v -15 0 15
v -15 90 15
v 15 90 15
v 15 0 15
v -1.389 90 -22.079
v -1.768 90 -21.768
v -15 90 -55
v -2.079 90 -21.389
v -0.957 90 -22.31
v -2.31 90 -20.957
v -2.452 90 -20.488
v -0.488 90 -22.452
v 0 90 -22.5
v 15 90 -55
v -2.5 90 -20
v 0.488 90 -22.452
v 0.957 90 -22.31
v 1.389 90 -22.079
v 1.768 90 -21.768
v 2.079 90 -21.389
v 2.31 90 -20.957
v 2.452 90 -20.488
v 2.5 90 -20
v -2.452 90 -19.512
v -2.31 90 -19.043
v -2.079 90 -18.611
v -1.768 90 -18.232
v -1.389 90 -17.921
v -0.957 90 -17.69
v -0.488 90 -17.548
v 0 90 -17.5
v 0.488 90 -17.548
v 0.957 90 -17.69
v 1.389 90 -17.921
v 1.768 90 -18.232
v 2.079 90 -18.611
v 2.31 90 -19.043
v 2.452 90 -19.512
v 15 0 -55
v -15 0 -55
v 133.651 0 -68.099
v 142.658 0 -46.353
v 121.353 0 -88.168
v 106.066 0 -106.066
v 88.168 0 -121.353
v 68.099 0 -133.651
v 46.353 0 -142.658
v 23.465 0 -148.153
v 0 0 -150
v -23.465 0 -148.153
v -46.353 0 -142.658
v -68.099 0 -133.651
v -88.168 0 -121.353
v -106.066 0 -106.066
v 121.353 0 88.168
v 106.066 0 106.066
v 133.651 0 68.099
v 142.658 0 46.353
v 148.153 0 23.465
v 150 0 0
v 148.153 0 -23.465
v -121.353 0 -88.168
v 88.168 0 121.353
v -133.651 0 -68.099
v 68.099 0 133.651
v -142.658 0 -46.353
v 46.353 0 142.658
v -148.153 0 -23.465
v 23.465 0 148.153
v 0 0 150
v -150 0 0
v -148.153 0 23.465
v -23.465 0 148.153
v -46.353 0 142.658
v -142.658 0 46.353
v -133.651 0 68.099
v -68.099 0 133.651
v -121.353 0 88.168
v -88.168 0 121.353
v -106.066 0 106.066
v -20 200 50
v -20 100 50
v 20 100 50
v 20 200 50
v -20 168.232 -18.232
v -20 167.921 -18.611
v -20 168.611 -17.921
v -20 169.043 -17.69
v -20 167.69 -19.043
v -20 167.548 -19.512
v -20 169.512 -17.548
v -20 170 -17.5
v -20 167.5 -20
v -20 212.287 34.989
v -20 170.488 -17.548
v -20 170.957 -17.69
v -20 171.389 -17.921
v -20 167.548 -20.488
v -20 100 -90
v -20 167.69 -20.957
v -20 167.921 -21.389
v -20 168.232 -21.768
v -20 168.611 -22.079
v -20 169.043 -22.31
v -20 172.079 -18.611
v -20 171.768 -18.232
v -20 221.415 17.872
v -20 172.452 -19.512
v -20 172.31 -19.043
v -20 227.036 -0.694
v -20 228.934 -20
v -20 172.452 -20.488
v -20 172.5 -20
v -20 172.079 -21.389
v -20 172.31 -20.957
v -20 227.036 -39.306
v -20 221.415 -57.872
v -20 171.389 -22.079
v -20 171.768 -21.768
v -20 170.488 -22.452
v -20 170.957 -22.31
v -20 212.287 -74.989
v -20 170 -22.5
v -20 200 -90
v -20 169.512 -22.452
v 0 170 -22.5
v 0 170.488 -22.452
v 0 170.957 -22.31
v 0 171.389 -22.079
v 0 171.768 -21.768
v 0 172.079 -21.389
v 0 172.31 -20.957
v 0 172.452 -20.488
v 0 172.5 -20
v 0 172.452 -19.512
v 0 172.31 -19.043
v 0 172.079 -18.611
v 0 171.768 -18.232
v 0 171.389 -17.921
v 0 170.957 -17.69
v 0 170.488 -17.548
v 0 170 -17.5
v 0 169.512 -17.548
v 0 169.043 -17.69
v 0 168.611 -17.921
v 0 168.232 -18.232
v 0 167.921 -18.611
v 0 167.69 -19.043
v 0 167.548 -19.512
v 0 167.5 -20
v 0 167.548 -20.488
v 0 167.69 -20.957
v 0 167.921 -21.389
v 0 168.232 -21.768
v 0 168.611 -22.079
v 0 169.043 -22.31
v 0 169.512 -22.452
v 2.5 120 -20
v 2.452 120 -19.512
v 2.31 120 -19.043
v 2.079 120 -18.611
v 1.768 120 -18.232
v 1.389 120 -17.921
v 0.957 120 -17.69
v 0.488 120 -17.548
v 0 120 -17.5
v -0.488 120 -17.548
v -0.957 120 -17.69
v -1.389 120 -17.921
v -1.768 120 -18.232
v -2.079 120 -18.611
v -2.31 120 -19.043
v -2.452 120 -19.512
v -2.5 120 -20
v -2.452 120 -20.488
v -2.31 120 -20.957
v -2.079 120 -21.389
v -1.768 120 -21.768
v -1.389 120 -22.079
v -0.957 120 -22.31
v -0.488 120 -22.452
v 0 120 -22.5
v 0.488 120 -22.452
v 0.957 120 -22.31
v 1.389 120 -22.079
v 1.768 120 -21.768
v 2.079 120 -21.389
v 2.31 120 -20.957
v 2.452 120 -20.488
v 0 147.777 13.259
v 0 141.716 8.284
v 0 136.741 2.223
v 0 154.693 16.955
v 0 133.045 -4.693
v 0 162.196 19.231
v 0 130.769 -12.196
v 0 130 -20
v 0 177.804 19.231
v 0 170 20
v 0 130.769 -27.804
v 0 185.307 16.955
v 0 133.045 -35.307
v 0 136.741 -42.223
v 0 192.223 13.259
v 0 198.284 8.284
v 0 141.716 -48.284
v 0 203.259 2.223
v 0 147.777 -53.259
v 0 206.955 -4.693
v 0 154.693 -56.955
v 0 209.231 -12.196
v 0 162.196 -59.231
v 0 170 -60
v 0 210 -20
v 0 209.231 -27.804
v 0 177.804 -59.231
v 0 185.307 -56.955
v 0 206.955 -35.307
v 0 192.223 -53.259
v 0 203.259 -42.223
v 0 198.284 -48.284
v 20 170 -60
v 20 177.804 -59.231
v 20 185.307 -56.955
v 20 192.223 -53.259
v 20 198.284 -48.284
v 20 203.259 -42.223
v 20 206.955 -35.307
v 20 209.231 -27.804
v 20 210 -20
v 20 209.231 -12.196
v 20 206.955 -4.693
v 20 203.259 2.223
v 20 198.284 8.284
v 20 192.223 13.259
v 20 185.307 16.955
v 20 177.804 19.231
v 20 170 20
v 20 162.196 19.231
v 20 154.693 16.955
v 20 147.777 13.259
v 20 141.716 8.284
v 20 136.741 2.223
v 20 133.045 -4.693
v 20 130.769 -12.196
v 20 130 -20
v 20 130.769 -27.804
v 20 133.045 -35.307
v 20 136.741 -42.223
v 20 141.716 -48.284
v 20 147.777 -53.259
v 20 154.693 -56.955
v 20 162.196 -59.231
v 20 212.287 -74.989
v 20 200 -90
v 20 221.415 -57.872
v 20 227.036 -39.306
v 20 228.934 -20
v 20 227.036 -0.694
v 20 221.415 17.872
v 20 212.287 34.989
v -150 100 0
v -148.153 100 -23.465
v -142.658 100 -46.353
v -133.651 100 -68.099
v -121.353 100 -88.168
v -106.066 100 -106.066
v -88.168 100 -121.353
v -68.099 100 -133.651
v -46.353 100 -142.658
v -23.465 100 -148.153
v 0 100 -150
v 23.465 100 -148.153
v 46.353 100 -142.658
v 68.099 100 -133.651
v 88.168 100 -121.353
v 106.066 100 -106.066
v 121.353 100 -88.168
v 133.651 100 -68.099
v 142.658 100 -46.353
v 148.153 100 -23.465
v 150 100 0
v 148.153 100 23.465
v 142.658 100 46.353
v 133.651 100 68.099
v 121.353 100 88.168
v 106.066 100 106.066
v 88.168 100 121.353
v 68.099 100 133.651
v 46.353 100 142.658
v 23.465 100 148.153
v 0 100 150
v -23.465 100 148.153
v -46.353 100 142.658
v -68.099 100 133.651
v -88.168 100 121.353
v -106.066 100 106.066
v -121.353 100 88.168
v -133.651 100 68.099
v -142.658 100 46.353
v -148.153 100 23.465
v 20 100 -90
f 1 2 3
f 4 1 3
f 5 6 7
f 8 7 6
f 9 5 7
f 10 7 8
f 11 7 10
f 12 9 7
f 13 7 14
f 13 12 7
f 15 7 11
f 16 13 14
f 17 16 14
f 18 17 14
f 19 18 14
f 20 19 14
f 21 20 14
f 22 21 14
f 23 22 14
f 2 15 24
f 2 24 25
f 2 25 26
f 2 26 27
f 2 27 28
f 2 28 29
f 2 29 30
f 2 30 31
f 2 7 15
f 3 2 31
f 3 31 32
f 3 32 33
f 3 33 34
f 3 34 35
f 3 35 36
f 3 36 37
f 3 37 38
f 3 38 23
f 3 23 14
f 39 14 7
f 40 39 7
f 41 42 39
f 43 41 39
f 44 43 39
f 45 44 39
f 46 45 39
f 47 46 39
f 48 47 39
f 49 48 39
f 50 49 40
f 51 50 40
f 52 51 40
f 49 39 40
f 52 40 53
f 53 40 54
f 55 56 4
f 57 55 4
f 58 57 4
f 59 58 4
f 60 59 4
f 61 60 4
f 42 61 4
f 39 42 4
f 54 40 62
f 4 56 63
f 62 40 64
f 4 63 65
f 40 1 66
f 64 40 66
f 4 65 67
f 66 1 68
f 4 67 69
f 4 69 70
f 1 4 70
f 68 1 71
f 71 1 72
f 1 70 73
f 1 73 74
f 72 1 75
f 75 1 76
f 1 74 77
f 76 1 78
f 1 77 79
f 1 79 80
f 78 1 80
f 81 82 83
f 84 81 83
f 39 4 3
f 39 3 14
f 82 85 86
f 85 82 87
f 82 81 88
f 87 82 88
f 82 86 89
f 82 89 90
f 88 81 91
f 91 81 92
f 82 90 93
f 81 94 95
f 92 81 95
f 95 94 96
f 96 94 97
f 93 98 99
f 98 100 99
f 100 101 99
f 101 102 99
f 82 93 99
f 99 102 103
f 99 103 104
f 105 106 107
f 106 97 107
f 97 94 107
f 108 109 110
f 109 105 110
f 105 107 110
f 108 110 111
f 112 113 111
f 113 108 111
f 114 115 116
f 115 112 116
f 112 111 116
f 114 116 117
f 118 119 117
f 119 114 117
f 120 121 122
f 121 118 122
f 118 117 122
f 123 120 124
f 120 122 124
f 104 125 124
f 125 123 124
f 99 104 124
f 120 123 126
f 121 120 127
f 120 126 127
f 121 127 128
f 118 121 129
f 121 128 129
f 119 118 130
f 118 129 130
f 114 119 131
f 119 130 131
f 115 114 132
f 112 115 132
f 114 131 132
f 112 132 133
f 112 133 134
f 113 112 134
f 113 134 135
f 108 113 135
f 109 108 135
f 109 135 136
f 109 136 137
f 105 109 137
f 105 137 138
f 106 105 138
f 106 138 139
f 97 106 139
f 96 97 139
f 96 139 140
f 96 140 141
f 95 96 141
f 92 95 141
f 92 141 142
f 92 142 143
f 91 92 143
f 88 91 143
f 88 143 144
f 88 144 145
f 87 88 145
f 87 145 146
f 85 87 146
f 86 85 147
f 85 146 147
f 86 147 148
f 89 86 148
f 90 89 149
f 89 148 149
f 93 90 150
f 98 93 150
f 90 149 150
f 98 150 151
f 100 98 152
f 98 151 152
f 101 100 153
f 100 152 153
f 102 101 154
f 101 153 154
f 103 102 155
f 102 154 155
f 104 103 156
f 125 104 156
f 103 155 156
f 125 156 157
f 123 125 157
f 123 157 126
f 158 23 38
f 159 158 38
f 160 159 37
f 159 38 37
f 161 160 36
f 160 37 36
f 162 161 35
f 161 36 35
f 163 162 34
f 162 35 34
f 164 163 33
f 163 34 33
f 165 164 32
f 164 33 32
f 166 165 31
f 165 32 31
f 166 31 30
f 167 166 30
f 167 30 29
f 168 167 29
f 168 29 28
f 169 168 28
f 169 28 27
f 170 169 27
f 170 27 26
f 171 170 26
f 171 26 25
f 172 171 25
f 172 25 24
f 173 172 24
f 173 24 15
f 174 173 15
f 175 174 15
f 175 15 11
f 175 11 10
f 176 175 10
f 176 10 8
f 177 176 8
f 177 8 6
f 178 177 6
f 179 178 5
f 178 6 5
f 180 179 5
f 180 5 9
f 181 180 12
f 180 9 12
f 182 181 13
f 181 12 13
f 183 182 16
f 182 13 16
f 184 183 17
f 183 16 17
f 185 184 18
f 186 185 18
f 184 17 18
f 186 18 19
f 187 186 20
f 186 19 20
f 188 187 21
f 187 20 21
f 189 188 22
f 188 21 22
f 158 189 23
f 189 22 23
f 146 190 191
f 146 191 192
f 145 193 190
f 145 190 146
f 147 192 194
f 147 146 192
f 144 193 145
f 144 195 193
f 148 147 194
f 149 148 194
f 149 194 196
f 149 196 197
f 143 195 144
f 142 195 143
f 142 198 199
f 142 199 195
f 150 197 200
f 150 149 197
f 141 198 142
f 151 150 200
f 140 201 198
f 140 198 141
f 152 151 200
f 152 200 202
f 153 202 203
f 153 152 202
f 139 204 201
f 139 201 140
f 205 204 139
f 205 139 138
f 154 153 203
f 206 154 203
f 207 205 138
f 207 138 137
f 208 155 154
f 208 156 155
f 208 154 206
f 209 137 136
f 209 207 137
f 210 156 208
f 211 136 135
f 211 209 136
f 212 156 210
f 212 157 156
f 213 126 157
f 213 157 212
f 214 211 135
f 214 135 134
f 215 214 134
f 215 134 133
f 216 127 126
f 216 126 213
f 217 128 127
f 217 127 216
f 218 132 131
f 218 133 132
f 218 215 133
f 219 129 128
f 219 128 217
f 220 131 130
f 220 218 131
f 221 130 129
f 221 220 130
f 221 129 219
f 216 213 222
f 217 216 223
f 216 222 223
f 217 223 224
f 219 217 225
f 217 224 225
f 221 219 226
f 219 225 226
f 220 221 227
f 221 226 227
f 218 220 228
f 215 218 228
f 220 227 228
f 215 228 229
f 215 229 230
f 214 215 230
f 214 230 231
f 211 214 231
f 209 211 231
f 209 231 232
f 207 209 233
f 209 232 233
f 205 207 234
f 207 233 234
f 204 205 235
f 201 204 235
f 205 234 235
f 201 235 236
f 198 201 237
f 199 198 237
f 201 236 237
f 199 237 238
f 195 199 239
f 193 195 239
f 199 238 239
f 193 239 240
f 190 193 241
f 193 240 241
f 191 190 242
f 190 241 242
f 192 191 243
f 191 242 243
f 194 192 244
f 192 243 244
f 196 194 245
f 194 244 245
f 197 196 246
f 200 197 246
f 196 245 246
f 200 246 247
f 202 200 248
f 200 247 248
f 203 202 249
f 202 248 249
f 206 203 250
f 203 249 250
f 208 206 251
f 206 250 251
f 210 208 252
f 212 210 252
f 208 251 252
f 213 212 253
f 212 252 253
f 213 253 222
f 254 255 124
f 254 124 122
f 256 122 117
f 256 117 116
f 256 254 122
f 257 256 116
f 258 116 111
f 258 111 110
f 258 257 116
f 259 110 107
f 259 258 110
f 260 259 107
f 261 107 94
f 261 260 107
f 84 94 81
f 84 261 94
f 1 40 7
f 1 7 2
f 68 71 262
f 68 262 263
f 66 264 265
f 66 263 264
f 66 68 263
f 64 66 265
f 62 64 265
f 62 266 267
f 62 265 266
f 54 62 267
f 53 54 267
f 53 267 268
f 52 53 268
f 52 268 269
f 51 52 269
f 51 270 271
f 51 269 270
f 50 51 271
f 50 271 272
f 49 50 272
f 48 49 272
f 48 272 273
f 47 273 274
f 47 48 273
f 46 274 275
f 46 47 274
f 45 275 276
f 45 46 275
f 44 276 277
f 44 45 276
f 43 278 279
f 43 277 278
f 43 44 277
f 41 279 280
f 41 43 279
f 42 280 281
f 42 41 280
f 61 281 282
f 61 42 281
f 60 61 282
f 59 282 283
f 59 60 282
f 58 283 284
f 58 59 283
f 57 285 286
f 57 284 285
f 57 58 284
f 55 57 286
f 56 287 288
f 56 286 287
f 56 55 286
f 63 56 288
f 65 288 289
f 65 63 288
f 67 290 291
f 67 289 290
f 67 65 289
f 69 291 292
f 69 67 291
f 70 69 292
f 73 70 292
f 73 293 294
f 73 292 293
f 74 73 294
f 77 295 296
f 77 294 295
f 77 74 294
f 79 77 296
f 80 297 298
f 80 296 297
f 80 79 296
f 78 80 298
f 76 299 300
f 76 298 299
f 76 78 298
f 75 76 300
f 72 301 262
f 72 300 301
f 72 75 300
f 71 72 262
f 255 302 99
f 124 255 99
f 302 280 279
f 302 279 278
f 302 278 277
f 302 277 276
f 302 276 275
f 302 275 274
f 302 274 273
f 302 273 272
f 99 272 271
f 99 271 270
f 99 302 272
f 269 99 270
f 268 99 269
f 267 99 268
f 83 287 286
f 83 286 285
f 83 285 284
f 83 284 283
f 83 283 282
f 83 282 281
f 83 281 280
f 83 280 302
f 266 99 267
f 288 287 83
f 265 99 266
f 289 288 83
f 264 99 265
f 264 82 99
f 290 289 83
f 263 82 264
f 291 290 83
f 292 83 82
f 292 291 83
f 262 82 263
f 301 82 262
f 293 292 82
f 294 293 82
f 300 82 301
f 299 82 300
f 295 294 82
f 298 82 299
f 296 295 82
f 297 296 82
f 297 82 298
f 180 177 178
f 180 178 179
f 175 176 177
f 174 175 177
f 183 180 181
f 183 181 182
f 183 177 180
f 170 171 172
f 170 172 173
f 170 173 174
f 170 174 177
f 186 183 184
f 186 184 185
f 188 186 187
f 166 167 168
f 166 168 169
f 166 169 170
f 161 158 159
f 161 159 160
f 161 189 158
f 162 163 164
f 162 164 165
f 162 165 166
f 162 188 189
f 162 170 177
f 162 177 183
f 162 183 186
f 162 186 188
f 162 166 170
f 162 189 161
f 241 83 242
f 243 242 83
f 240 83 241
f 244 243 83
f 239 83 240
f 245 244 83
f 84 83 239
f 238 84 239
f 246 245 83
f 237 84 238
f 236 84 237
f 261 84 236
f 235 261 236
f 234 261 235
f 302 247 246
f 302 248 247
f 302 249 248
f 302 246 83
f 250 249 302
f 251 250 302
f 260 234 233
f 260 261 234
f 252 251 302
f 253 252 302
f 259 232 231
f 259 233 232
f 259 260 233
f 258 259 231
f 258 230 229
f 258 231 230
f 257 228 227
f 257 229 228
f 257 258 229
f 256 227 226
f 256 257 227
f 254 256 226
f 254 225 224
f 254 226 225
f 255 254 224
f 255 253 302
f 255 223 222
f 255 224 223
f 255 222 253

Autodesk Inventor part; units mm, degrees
ref_plane "YZ Plane" through (0, 0, 0) normal (1, 0, 0) x (0, 1, 0)
ref_plane "XZ Plane" through (0, 0, 0) normal (0, 1, 0) x (-1, 0, 0)
ref_plane "XY Plane" through (0, 0, 0) normal (0, 0, 1) x (1, 0, 0)
sketch "Sketch1" plane through (0, 0, 0) normal (0, 1, 0) x (-1, 0, 0)
  circle A0 centre (0, 0) radius 150
  dimension "d0" = 300
extrude "Extrusion1" add sketch "Sketch1" along normal blind 100
sketch "Sketch2" plane through (0, 100, 0) normal (0, 1, 0) x (1, 0, 0)
  line L0 (-20, -50) -> (20, -50)
  line L1 (20, -50) -> (20, 90)
  line L2 (20, 90) -> (-20, 90)
  line L3 (-20, 90) -> (-20, -50)
  point P0 (0, 0)
  dimension "d3" = 140
  dimension "d4" = 40
  dimension "d5" = 50
  dimension "d6" = 20
extrude "Extrusion2" add sketch "Sketch2" along normal blind 100
sketch "Sketch3" plane through (20, 100, 50) normal (1, 0, 0) x (0, 0, -1)
  line L0 (0, 100) -> (140, 100) projected
  arc A0 (140, 100) -> (0, 100) centre (70, 29.7912) ccw
  line L1 (0, 0) -> (0, 100) projected
  line L2 (0, 100) -> (140, 100)
  point P0 (50, -100)
  dimension "d9" = 99.1427
extrude "Extrusion3" add sketch "Sketch3" against normal blind 40
sketch "Sketch4" plane through (20, 100, 50) normal (1, 0, 0) x (0, 0, -1)
  circle A0 centre (70, 70) radius 40
  line L0 (200, 0) -> (-100, 0) projected
  line L1 (0, 0) -> (0, 100) projected
  point P0 (50, -100)
  dimension "d12" = 80
  dimension "d13" = 70
  dimension "d14" = 70
extrude "Extrusion4" cut sketch "Sketch4" against normal blind 20
sketch "Sketch5" plane through (0, 170, -20) normal (1, 0, 0) x (0, 0, -1)
  circle A0 centre (0, 0) radius 2.5
  circle A1 centre (0, 0) radius 40 projected
  point P0 (-20, -170)
  dimension "d20" = 5
extrude "Extrusion5" cut sketch "Sketch5" against normal blind 20 contours A0
sketch "Sketch6" plane through (0, 0, 0) normal (0, -1, 0) x (1, 0, 0)
  line L0 (-20, 50) -> (-20, -90) projected
  line L1 (20, -90) -> (20, 50) projected
  line L2 (20, 50) -> (-20, 50) projected
  line L3 (-20, -90) -> (20, -90) projected
  line L4 (-15, 15) -> (15, 15)
  line L5 (15, 15) -> (15, -55)
  line L6 (15, -55) -> (-15, -55)
  line L7 (-15, -55) -> (-15, 15)
  point P0 (0, 0)
  point P1 (0, 15)
  point P2 (0, 50)
  point P3 (15, -20)
  point P4 (20, -20)
  dimension "d23" = 30
  dimension "d24" = 70
extrude "Extrusion6" cut sketch "Sketch6" against normal blind 90 contours L4 L5 L6 L7
sketch "Sketch7" plane through (0, 90, 0) normal (0, -1, 0) x (1, 0, 0)
  line L0 (15, -55) -> (-15, -55) projected
  line L1 (15, 15) -> (15, -55) projected
  line L2 (-15, 15) -> (15, 15) projected
  line L3 (-15, -55) -> (-15, 15) projected
  line L4 (0, 20) -> (0, -60) projected
  circle A0 centre (0, -20) radius 2.5
  point P0 (0, 0)
  dimension "d28" = 5
extrude "Extrusion7" cut sketch "Sketch7" against normal blind 30 contours A0 L4 | L4 A0
properties part number "Robot_arm_base"
